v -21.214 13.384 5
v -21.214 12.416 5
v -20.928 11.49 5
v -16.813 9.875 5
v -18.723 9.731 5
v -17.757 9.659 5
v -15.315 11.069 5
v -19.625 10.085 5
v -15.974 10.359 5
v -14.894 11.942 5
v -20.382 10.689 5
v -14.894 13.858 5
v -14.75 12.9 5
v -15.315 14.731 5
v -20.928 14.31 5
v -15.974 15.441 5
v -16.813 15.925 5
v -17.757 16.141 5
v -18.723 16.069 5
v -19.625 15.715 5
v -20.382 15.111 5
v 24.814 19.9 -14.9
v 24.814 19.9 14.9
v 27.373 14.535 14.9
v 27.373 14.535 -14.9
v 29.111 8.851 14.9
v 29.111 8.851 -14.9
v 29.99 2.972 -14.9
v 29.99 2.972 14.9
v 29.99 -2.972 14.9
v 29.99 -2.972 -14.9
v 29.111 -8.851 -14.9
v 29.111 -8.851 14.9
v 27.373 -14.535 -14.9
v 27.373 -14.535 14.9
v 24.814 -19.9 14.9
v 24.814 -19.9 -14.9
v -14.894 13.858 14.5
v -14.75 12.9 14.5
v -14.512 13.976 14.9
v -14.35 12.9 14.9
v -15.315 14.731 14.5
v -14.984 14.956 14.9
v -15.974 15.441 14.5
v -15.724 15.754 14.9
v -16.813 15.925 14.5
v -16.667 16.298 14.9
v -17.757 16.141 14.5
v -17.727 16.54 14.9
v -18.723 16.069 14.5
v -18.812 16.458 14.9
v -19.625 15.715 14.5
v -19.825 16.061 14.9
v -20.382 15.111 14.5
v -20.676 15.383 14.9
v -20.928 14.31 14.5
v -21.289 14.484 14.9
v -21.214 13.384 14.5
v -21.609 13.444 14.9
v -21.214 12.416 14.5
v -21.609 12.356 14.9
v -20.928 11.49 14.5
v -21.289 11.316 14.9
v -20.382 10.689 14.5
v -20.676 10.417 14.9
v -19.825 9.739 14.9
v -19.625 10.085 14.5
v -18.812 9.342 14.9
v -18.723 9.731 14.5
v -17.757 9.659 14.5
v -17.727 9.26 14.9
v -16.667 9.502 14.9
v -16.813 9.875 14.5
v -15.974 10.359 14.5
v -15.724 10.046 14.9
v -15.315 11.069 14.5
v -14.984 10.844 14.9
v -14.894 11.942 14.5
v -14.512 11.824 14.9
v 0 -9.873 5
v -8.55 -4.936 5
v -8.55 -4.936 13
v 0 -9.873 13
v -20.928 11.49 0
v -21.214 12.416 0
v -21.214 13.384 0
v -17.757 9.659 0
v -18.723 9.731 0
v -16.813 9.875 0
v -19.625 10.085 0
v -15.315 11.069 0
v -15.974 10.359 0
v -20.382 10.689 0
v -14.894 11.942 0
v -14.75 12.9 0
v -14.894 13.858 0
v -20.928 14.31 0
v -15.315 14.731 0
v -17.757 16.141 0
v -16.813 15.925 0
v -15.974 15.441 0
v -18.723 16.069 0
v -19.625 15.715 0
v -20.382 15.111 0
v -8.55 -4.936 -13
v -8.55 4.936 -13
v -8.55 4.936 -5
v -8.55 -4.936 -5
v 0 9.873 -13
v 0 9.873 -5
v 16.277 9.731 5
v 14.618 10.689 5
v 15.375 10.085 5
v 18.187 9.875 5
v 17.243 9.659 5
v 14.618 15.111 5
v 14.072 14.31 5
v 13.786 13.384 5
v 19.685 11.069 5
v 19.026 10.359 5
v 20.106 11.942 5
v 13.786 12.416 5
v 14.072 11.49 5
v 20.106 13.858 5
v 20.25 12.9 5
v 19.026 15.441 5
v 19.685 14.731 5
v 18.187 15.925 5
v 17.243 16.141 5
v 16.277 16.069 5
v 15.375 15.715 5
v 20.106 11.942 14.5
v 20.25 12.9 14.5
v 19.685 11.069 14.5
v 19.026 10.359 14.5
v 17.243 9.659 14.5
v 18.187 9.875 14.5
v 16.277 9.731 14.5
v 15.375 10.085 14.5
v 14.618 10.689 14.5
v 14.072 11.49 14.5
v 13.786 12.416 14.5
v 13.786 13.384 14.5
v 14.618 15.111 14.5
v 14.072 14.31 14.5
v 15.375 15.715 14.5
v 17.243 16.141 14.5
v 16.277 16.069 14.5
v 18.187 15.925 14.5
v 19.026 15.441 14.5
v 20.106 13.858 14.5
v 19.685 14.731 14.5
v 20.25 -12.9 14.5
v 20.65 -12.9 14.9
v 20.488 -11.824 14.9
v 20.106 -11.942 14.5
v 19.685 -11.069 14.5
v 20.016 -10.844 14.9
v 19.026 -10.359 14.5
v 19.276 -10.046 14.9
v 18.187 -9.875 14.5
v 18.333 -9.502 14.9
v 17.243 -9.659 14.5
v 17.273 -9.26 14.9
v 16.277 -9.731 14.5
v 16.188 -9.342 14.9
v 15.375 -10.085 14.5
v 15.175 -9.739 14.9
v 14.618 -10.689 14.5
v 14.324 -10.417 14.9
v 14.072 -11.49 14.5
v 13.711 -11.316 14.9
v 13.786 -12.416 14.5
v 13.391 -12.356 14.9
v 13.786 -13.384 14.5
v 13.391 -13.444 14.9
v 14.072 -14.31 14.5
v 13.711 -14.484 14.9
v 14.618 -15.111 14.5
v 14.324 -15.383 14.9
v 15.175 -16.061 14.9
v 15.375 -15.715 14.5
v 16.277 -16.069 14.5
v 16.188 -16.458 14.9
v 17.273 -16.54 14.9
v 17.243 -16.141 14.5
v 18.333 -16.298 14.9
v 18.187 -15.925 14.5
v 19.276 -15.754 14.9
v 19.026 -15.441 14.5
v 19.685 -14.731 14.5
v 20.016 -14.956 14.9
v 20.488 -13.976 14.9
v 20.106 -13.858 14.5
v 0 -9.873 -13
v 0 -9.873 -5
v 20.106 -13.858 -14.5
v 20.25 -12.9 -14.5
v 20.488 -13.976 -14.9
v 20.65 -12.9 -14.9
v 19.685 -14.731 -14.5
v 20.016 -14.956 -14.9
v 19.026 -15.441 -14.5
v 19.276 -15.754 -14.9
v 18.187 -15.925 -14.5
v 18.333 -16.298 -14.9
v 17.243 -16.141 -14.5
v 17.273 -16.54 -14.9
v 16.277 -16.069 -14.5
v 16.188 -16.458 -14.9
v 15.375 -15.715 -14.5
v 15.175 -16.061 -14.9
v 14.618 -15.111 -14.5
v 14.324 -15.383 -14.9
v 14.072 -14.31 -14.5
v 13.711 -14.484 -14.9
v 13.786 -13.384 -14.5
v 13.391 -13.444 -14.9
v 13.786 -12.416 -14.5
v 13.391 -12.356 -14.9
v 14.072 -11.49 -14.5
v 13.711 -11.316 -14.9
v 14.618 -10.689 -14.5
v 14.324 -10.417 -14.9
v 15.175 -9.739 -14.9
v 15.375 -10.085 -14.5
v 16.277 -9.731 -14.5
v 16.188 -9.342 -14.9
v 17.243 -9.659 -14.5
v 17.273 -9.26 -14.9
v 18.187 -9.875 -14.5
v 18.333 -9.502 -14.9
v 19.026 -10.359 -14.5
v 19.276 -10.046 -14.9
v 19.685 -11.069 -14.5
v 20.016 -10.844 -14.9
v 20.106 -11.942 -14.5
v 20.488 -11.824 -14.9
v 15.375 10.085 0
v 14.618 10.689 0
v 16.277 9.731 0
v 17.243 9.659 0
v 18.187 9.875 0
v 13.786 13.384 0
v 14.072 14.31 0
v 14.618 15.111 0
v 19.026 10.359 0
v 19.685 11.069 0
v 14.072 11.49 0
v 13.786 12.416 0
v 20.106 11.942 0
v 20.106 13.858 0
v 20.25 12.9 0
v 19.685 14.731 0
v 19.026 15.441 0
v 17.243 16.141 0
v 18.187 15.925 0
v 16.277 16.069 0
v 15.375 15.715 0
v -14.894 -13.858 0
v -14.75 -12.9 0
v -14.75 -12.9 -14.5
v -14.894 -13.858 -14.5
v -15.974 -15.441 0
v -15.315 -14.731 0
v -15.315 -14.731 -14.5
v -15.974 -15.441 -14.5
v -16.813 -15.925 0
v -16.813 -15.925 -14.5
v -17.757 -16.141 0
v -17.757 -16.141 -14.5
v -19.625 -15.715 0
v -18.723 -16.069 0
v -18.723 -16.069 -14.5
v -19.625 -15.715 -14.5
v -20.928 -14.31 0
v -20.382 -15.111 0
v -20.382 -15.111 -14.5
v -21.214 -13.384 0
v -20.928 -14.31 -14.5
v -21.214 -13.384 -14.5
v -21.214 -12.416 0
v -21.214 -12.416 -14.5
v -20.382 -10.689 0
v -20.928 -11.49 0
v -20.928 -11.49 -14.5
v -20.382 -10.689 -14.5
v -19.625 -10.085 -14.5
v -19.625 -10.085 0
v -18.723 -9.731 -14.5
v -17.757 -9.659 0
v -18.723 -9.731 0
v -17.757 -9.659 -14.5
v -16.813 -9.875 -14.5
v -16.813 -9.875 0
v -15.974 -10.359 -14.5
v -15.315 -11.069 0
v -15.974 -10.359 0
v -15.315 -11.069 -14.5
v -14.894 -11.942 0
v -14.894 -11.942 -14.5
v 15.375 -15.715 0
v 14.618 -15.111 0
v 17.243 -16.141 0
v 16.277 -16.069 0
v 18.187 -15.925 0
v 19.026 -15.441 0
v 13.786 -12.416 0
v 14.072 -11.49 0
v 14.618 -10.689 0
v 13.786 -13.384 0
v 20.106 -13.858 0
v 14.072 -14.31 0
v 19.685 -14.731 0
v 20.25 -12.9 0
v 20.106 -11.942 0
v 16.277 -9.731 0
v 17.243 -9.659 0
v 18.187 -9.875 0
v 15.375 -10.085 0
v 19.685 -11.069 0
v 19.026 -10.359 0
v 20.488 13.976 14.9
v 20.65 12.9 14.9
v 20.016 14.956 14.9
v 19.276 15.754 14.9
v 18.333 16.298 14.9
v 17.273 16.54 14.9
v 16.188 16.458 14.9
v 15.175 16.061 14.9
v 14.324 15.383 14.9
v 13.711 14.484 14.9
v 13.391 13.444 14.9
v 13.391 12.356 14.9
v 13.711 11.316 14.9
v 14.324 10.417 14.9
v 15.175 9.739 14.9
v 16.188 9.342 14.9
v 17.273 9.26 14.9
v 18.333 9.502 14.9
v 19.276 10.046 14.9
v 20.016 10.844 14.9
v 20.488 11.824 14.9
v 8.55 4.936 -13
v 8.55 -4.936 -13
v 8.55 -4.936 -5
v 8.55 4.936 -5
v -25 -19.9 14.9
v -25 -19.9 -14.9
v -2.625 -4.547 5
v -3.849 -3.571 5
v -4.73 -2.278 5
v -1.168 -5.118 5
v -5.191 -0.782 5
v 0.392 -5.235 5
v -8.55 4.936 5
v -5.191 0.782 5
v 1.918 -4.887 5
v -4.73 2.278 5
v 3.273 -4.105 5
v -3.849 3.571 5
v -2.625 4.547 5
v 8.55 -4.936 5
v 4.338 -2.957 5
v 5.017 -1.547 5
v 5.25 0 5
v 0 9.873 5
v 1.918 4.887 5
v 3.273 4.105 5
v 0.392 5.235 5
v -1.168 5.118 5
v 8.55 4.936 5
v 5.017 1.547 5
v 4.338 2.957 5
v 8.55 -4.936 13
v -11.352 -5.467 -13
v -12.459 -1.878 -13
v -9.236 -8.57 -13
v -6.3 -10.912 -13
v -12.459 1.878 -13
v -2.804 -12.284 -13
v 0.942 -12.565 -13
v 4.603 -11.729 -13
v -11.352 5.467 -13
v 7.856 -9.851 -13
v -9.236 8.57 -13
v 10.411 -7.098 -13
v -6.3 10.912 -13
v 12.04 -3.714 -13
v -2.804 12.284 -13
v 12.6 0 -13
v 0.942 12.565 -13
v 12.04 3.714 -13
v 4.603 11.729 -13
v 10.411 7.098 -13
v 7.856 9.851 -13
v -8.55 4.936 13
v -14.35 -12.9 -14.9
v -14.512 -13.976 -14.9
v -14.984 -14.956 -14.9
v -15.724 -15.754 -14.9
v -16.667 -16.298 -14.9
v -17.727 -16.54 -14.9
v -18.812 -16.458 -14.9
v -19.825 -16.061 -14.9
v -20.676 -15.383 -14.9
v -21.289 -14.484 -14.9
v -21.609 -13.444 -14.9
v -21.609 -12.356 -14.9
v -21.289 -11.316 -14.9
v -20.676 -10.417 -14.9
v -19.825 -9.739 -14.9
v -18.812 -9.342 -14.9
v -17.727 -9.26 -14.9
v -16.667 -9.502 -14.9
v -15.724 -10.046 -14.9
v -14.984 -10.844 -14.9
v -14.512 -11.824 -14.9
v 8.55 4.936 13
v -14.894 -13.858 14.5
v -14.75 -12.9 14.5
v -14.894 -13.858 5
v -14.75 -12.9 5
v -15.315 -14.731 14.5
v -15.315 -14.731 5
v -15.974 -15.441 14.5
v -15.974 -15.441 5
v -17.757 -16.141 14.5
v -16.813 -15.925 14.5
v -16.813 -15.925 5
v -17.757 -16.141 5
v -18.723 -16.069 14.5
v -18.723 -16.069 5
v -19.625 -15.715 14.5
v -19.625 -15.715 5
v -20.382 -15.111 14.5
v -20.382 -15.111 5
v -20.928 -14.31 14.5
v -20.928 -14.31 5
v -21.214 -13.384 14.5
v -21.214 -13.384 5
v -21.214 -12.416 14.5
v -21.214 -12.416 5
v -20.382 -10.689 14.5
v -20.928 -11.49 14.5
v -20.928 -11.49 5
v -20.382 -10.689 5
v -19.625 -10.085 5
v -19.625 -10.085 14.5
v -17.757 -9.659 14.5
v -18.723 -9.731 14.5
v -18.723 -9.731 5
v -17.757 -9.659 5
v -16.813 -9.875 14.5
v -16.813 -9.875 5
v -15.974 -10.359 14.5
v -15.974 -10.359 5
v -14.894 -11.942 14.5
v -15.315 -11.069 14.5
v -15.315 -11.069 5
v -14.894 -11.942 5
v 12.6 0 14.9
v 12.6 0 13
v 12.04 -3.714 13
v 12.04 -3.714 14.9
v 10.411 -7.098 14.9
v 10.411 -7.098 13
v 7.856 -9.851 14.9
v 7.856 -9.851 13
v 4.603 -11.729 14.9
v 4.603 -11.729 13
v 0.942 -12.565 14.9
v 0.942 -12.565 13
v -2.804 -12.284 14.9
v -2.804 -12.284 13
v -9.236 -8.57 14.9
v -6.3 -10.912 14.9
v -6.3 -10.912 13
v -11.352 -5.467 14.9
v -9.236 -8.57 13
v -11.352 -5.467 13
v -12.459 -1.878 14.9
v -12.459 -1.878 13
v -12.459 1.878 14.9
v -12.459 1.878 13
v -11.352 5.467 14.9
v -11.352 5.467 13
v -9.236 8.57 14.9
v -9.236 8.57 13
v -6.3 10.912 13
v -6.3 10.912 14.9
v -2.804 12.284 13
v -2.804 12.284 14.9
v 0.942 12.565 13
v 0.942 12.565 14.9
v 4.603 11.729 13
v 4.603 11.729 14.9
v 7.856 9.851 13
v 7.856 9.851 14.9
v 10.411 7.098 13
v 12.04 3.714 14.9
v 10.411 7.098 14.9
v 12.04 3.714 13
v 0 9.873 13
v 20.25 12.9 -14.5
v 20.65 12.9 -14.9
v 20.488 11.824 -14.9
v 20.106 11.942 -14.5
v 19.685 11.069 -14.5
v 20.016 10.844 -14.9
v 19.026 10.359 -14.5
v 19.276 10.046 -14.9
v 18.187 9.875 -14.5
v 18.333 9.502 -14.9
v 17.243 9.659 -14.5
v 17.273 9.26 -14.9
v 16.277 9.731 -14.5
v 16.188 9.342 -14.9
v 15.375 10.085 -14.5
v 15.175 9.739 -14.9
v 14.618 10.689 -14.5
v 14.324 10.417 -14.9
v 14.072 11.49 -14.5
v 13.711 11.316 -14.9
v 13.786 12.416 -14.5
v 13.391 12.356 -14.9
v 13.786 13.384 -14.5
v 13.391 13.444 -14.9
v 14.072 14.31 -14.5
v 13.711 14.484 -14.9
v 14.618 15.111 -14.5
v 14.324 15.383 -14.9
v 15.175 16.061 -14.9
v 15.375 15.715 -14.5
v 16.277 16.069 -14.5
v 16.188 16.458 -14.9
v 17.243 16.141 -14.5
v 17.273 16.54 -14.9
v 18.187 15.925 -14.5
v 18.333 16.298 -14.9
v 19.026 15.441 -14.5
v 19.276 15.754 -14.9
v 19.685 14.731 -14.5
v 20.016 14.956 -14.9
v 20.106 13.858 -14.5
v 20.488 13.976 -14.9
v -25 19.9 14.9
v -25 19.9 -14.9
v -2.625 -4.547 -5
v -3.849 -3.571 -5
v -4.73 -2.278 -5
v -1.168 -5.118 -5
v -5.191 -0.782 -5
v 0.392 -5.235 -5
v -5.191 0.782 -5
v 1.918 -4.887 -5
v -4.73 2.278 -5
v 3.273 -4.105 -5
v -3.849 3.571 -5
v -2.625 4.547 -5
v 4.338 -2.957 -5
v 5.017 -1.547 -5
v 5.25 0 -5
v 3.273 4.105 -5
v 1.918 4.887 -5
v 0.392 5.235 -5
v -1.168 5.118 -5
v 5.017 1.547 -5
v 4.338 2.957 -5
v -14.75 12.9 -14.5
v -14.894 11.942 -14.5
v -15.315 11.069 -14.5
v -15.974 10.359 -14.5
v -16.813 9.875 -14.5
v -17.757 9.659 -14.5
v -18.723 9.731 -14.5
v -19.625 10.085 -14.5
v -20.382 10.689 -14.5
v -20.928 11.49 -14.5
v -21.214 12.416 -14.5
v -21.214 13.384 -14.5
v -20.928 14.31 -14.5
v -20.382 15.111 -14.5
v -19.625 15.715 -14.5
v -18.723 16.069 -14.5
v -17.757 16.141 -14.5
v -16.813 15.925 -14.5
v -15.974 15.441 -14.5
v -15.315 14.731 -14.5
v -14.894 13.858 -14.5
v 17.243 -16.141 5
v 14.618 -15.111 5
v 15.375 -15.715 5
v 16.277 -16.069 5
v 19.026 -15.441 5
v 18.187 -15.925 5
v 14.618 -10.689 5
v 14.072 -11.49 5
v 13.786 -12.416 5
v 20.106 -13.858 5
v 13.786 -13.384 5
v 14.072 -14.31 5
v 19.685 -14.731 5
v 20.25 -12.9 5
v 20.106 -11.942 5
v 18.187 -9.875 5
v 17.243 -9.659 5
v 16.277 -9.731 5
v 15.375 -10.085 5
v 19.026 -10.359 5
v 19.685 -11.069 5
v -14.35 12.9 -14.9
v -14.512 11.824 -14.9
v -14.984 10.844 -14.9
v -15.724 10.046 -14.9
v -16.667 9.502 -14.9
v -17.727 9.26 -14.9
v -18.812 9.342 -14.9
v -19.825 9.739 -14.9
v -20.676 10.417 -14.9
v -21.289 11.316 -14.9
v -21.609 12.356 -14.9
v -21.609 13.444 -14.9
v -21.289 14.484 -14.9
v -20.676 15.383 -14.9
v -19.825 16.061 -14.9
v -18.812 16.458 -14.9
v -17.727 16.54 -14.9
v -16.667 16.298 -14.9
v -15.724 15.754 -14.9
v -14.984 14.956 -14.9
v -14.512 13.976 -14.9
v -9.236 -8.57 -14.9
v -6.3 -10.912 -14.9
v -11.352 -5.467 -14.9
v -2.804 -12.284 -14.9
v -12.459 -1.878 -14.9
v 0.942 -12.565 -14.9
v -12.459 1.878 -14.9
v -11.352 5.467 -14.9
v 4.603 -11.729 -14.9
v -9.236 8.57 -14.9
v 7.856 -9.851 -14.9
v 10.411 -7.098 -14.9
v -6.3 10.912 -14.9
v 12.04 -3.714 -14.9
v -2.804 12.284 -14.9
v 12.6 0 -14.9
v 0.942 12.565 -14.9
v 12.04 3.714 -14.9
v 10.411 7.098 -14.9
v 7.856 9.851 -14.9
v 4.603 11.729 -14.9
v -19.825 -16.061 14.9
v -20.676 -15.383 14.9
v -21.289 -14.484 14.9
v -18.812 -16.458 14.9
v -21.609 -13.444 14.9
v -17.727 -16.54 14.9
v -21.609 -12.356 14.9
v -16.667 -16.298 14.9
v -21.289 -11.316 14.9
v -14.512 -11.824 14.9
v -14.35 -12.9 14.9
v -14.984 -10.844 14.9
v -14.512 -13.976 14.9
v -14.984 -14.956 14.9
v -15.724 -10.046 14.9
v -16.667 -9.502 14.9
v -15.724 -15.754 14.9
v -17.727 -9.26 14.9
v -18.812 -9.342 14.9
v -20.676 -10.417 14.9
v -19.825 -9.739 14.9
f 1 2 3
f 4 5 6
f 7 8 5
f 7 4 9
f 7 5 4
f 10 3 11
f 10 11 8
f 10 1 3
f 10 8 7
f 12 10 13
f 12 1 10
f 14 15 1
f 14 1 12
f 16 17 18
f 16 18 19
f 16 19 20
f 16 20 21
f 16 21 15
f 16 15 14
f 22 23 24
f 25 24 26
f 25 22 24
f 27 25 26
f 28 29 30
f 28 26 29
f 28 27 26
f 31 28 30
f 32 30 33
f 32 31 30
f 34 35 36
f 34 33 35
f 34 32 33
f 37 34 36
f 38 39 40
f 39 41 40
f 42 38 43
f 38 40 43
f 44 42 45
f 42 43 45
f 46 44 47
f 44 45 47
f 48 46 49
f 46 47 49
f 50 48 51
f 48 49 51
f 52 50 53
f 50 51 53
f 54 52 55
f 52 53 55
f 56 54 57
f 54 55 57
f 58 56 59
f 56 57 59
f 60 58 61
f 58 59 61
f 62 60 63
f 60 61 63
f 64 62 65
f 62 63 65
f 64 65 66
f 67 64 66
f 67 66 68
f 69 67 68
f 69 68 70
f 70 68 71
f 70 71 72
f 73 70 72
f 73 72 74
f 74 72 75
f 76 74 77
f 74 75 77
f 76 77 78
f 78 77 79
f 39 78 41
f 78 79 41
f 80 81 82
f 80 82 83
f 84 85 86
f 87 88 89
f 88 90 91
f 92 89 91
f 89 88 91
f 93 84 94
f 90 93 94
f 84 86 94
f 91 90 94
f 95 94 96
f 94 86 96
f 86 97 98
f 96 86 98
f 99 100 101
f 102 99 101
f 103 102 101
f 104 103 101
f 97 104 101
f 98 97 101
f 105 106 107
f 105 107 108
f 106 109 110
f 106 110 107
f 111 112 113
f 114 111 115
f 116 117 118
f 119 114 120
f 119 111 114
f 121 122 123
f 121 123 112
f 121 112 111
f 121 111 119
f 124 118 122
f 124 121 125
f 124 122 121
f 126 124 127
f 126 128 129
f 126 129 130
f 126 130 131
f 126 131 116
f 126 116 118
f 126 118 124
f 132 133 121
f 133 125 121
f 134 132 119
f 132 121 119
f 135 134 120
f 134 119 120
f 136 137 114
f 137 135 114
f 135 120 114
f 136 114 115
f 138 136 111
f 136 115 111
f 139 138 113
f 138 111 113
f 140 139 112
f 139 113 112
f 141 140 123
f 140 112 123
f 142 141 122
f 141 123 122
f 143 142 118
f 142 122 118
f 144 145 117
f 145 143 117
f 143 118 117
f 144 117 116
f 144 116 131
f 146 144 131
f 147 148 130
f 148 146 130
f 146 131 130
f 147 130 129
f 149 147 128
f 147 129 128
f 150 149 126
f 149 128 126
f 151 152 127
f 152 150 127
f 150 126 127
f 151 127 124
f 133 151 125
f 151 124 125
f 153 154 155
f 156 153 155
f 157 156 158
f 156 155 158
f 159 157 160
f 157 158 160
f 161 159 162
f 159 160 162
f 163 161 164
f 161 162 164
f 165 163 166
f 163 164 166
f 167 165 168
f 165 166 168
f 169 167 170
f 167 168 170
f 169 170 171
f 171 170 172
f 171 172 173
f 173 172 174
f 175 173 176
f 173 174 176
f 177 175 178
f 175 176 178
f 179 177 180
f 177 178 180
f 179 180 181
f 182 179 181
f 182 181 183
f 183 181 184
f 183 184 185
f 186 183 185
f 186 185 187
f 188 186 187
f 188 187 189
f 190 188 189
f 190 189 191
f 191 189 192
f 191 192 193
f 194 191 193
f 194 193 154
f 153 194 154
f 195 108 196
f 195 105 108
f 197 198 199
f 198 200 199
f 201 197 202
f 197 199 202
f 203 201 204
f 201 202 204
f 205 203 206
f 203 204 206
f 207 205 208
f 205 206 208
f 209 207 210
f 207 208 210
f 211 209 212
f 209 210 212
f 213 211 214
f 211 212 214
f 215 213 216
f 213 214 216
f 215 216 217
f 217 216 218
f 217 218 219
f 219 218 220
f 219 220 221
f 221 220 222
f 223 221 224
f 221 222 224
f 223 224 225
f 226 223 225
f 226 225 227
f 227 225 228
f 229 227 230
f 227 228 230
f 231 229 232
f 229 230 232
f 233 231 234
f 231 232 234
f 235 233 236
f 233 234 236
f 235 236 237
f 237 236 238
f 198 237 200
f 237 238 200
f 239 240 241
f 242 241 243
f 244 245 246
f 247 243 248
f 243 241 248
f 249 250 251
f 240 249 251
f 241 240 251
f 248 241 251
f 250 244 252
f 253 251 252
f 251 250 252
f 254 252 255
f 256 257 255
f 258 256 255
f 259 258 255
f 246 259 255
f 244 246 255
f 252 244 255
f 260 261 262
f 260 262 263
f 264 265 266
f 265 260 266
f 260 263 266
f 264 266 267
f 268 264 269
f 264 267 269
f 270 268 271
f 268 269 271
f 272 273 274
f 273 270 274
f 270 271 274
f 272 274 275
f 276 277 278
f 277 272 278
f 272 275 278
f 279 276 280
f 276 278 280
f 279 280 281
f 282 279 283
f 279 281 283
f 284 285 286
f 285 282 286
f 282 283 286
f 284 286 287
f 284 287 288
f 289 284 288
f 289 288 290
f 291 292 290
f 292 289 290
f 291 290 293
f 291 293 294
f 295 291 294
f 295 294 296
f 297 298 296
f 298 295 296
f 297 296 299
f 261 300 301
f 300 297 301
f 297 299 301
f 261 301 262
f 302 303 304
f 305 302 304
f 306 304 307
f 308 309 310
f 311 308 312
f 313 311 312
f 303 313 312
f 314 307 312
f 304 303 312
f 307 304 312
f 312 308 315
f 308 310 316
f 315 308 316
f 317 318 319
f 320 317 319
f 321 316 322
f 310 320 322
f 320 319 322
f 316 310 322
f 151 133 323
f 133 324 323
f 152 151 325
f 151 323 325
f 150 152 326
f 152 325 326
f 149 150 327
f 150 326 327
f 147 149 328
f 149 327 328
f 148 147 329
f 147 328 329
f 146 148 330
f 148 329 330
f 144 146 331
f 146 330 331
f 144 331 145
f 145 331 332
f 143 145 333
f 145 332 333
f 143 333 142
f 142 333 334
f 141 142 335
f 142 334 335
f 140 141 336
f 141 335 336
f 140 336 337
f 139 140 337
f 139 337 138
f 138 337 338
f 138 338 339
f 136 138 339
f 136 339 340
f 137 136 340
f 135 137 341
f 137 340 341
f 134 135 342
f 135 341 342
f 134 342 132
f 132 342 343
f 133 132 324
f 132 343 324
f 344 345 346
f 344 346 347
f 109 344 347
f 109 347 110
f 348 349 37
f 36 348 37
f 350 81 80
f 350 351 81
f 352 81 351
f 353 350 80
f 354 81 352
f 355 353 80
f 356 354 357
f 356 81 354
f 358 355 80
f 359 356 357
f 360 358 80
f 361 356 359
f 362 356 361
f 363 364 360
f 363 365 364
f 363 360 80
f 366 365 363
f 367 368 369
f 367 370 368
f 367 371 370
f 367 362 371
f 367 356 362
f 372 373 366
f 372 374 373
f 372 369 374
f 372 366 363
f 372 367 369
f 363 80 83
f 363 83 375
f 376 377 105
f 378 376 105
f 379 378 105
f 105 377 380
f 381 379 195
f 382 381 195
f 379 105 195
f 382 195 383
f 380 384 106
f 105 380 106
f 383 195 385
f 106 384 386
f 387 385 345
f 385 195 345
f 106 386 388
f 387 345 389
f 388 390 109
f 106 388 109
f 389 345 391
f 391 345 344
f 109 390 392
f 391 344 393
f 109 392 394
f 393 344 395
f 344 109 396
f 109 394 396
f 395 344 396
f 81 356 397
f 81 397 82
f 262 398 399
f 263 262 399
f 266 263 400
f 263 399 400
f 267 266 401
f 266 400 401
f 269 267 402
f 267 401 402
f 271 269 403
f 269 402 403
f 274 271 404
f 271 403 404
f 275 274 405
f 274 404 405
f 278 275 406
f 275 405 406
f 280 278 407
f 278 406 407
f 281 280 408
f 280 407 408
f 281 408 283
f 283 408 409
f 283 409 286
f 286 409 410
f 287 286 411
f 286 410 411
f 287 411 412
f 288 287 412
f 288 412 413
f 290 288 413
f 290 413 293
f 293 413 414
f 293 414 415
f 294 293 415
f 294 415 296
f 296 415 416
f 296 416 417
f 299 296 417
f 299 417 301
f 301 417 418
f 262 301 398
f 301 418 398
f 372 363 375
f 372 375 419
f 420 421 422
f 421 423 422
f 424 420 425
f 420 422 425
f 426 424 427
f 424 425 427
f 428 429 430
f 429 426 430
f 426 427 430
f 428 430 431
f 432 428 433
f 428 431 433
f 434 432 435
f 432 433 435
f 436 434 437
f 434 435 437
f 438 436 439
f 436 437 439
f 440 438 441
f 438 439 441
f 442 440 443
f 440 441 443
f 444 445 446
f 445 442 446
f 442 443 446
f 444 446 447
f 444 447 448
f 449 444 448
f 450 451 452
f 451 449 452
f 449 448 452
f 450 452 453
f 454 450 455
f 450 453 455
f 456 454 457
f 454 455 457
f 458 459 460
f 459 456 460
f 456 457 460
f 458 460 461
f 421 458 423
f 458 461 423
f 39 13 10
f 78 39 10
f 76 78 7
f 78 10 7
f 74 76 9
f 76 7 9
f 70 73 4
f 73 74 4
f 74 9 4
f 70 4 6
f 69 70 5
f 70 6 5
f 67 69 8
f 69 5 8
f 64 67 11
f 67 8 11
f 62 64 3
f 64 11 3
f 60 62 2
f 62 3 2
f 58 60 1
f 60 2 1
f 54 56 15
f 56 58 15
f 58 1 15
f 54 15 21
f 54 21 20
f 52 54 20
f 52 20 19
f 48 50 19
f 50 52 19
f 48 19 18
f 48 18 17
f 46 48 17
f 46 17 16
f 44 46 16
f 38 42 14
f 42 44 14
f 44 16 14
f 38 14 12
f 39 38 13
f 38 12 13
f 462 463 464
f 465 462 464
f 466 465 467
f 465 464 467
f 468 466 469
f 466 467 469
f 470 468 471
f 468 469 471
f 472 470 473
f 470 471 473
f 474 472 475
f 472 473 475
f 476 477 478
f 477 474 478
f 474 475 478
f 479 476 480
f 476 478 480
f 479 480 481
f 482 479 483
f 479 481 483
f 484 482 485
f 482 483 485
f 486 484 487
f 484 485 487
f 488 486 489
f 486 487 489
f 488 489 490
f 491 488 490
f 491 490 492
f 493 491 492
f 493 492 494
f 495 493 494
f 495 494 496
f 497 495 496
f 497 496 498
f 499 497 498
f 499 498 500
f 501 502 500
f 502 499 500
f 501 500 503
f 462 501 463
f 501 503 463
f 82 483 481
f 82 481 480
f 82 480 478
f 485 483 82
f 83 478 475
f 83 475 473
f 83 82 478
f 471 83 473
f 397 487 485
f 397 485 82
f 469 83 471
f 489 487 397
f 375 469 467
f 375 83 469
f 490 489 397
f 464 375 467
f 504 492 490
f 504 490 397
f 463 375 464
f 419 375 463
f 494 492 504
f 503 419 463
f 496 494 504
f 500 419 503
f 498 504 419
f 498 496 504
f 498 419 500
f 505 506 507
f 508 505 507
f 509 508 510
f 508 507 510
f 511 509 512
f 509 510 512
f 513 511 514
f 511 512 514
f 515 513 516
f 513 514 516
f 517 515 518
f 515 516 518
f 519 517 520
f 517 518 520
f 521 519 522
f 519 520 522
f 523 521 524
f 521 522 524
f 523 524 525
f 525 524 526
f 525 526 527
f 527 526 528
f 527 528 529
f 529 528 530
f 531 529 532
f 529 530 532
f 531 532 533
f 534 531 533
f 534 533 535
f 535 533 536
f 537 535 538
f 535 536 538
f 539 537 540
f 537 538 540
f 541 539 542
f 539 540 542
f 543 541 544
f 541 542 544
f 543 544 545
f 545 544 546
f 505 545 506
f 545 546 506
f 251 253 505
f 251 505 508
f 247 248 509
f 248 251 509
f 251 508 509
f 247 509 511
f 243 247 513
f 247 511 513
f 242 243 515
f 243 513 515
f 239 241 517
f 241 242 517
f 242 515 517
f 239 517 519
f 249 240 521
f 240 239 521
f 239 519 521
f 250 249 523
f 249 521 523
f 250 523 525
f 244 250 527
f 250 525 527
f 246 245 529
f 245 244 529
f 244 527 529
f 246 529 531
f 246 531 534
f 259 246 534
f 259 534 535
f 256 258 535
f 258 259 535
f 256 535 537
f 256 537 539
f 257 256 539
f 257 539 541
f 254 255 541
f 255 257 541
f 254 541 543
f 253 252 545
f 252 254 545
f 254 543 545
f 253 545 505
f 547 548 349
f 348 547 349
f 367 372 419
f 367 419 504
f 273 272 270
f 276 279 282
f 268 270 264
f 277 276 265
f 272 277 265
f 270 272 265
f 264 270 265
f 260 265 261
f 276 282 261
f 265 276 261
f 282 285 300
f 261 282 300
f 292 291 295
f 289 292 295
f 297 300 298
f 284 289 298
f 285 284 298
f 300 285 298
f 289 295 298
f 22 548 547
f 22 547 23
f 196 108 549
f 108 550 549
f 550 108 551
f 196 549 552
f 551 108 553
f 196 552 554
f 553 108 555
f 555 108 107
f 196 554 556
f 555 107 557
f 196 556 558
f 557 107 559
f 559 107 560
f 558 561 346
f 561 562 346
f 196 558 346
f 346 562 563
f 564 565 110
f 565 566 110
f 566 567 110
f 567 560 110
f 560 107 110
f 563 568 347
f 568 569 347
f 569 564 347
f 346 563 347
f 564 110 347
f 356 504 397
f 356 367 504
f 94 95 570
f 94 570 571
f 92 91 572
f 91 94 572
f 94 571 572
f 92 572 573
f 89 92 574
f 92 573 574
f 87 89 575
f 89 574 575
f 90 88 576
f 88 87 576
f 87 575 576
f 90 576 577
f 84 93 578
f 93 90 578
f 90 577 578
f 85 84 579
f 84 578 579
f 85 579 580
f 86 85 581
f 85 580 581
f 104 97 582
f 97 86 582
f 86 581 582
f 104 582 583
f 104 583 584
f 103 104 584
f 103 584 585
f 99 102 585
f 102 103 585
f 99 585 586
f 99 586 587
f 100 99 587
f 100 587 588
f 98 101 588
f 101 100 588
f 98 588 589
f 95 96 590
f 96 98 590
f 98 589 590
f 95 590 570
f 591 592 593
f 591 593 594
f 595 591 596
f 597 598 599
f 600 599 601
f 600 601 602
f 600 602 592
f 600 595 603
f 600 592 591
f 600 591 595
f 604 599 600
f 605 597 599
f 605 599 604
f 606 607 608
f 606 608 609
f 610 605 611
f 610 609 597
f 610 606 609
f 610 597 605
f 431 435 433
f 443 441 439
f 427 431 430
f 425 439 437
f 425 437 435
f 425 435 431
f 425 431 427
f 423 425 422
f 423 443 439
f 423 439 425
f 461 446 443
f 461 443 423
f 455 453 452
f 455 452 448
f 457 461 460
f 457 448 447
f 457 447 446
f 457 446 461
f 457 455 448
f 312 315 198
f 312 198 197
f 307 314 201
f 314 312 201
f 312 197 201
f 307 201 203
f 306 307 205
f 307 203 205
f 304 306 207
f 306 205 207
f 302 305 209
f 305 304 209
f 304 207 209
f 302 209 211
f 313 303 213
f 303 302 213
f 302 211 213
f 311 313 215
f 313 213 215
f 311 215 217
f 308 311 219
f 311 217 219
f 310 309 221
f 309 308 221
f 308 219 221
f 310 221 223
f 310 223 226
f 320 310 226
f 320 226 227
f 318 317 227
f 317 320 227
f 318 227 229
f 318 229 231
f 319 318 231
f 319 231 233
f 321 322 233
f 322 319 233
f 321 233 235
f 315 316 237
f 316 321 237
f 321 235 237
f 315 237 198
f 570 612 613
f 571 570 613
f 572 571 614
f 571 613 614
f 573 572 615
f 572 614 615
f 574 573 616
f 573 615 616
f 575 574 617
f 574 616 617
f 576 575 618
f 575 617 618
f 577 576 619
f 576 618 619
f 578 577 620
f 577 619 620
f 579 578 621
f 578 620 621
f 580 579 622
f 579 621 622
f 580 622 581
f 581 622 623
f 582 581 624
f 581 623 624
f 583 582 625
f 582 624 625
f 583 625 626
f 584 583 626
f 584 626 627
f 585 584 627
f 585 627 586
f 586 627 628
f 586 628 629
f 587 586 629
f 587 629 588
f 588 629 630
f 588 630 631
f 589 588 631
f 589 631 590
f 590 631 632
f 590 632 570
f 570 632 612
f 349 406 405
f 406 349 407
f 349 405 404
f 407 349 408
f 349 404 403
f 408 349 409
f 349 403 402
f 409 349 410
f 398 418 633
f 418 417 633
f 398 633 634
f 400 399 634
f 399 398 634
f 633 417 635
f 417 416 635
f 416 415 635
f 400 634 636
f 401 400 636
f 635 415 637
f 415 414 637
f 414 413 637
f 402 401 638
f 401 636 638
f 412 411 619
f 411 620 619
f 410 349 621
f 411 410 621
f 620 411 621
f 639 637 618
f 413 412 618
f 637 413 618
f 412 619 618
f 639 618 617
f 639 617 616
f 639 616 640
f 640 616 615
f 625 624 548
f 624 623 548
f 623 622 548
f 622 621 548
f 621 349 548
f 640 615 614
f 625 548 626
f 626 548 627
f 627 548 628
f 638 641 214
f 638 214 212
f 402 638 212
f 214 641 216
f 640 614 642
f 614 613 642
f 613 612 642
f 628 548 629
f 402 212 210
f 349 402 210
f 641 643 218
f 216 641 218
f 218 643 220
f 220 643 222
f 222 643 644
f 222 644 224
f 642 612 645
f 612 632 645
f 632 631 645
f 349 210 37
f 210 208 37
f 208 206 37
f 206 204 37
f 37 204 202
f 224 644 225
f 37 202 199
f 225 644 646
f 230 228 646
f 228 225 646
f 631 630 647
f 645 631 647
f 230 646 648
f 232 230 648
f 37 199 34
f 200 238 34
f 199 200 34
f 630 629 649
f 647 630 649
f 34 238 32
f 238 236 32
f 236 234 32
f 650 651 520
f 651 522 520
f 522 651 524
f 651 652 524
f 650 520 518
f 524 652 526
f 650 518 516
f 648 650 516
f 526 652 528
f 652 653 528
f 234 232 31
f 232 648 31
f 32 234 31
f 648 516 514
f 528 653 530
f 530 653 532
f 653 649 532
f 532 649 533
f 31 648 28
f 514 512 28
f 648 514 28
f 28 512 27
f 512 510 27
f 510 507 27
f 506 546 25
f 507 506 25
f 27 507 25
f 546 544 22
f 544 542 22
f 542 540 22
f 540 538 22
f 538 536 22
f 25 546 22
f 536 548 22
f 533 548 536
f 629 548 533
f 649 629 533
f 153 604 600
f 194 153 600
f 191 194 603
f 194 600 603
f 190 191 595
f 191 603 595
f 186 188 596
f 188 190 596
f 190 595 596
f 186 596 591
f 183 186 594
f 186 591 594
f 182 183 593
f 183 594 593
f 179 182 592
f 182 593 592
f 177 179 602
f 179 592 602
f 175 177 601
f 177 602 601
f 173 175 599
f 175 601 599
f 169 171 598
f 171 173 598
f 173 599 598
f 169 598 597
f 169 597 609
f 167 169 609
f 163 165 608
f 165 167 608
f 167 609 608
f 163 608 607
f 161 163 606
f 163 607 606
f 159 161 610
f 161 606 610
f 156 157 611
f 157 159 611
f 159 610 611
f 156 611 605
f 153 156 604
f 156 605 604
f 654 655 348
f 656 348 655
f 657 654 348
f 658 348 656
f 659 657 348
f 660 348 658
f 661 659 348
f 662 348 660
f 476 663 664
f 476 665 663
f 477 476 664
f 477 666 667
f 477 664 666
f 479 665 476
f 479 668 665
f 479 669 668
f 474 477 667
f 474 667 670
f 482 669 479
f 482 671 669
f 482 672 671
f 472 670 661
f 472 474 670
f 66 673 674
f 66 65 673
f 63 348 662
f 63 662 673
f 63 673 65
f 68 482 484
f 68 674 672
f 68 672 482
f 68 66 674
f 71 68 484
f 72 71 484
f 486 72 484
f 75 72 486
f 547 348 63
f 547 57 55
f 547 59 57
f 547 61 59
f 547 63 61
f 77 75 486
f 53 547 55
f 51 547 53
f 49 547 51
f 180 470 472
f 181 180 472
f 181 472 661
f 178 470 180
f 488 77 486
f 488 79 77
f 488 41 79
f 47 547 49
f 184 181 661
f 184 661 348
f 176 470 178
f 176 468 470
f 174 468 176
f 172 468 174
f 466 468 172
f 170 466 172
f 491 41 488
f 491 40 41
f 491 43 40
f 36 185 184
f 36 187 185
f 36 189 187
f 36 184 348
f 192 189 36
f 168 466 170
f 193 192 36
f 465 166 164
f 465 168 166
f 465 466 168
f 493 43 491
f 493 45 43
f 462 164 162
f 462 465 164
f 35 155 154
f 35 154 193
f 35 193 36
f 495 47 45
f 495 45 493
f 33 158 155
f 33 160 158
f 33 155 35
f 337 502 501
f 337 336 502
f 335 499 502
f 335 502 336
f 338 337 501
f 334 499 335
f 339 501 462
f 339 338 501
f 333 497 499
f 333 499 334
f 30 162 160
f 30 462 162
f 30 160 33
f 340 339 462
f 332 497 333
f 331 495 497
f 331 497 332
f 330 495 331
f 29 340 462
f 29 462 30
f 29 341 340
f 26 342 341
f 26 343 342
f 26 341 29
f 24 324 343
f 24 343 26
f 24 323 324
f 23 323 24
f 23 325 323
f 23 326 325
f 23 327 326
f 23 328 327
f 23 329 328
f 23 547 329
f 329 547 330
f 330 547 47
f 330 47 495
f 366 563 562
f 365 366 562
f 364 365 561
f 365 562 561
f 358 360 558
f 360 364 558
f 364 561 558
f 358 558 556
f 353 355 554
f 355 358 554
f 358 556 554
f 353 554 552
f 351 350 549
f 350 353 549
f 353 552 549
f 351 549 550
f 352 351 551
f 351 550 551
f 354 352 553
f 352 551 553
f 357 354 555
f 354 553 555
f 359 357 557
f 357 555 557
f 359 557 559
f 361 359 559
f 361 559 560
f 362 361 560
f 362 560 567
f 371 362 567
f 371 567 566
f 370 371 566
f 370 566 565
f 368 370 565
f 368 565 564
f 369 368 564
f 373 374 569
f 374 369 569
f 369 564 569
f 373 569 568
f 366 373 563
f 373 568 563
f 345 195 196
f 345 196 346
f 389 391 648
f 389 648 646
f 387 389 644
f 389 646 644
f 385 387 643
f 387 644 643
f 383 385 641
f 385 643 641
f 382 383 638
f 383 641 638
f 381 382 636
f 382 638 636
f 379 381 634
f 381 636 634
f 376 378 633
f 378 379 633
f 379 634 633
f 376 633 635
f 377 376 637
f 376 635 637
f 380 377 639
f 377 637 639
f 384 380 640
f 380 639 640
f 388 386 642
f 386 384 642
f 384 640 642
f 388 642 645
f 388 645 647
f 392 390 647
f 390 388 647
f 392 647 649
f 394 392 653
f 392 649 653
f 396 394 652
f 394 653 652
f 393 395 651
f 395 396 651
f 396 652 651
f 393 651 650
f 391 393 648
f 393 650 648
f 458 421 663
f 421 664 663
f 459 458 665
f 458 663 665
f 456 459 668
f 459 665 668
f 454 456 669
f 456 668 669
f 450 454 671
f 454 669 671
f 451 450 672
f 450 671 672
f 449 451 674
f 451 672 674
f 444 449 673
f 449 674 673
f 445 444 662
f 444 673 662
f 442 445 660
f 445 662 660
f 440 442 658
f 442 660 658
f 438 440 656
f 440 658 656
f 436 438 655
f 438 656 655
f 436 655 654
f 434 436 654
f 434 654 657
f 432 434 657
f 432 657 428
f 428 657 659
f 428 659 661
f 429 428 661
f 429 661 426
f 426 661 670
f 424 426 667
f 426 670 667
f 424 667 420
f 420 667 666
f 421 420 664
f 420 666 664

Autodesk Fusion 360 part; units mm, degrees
sketch "Sketch1" plane through (0, 0, 0) normal (0, 0, 1) x (1, 0, 0)
  circle A0 centre (0, 0) radius 12.6
  line L0 (-25, 19.9) -> (-25, -19.9)
  line L1 (-25, 19.9) -> (24.8138, 19.9)
  line L2 (-25, -19.9) -> (24.8138, -19.9)
  circle A1 centre (0, 0) radius 5.25
  arc A2 (24.8138, -19.9) -> (24.8138, 19.9) centre (-10, 0) ccw
  line L3 (0, 0) -> (-10, 0) construction
  line L4 (8.55, 4.9363) -> (0, 9.8727)
  line L5 (0, 9.8727) -> (-8.55, 4.9363)
  line L6 (-8.55, 4.9363) -> (-8.55, -4.9363)
  line L7 (-8.55, -4.9363) -> (0, -9.8727)
  line L8 (0, -9.8727) -> (8.55, -4.9363)
  line L9 (8.55, -4.9363) -> (8.55, 4.9363)
  circle A3 centre (-18, 12.9) radius 3.25
  circle A4 centre (-18, -12.9) radius 3.25
  circle A5 centre (17, -12.9) radius 3.25
  circle A6 centre (17, 12.9) radius 3.25
  line L10 (-18, 12.9) -> (17, 12.9) construction
  line L11 (17, 12.9) -> (17, -12.9) construction
  line L12 (17, -12.9) -> (-18, -12.9) construction
  dimension "d1" = 25.2
  dimension "d3" = 19.9
  dimension "d4" = 19.9
  dimension "d7" = 10.5
  dimension "d8" = 40.1
  dimension "d10" = 17.1
  dimension "d19" = 7
  dimension "d20" = 6.5
  dimension "d22" = 7
  dimension "d23" = 35
  dimension "d28" = 18
  dimension "d29" = 10
  dimension "d30" = 25
extrude "Extrude1" add sketch "Sketch1" along normal mid plane 29.8 contours L0 L1 L2 A2 makes body 1
extrude "Extrude3" add sketch "Sketch1" along normal mid plane 26 contours A0 bodies 1
extrude "Extrude4" add sketch "Sketch1" along normal mid plane 10 contours L4 L5 L6 L7 L8 L9 bodies 1
extrude "Extrude5" add sketch "Sketch1" along normal blind 5 and the other way blind 0 contours A3 | A4 | A5 | A6 bodies 1
copy_body "Body->Comp1" bodies 1 removing the originals makes body 2 in component "side brace lwr mount nut insert"
chamfer "Chamfer1" distance 0.4 angle 45 8 edges at (13.9699, 14.0753, 14.9) (-21.0301, 14.0753, 14.9) (-21.0301, -11.7247, 14.9) (13.9699, -11.7247, 14.9) (13.9699, -14.0753, -14.9) (-21.0301, 11.7247, -14.9) (13.9699, 11.7247, -14.9) (-21.0301, -14.0753, -14.9) on bodies 2 in component "side brace lwr mount nut insert"
component "side brace lwr mount nut insert" placed x (1, 0, 0) y (0, 1, 0) z (0, 0, 1) at (0, 0, 0)
equation "d4 = d3"
